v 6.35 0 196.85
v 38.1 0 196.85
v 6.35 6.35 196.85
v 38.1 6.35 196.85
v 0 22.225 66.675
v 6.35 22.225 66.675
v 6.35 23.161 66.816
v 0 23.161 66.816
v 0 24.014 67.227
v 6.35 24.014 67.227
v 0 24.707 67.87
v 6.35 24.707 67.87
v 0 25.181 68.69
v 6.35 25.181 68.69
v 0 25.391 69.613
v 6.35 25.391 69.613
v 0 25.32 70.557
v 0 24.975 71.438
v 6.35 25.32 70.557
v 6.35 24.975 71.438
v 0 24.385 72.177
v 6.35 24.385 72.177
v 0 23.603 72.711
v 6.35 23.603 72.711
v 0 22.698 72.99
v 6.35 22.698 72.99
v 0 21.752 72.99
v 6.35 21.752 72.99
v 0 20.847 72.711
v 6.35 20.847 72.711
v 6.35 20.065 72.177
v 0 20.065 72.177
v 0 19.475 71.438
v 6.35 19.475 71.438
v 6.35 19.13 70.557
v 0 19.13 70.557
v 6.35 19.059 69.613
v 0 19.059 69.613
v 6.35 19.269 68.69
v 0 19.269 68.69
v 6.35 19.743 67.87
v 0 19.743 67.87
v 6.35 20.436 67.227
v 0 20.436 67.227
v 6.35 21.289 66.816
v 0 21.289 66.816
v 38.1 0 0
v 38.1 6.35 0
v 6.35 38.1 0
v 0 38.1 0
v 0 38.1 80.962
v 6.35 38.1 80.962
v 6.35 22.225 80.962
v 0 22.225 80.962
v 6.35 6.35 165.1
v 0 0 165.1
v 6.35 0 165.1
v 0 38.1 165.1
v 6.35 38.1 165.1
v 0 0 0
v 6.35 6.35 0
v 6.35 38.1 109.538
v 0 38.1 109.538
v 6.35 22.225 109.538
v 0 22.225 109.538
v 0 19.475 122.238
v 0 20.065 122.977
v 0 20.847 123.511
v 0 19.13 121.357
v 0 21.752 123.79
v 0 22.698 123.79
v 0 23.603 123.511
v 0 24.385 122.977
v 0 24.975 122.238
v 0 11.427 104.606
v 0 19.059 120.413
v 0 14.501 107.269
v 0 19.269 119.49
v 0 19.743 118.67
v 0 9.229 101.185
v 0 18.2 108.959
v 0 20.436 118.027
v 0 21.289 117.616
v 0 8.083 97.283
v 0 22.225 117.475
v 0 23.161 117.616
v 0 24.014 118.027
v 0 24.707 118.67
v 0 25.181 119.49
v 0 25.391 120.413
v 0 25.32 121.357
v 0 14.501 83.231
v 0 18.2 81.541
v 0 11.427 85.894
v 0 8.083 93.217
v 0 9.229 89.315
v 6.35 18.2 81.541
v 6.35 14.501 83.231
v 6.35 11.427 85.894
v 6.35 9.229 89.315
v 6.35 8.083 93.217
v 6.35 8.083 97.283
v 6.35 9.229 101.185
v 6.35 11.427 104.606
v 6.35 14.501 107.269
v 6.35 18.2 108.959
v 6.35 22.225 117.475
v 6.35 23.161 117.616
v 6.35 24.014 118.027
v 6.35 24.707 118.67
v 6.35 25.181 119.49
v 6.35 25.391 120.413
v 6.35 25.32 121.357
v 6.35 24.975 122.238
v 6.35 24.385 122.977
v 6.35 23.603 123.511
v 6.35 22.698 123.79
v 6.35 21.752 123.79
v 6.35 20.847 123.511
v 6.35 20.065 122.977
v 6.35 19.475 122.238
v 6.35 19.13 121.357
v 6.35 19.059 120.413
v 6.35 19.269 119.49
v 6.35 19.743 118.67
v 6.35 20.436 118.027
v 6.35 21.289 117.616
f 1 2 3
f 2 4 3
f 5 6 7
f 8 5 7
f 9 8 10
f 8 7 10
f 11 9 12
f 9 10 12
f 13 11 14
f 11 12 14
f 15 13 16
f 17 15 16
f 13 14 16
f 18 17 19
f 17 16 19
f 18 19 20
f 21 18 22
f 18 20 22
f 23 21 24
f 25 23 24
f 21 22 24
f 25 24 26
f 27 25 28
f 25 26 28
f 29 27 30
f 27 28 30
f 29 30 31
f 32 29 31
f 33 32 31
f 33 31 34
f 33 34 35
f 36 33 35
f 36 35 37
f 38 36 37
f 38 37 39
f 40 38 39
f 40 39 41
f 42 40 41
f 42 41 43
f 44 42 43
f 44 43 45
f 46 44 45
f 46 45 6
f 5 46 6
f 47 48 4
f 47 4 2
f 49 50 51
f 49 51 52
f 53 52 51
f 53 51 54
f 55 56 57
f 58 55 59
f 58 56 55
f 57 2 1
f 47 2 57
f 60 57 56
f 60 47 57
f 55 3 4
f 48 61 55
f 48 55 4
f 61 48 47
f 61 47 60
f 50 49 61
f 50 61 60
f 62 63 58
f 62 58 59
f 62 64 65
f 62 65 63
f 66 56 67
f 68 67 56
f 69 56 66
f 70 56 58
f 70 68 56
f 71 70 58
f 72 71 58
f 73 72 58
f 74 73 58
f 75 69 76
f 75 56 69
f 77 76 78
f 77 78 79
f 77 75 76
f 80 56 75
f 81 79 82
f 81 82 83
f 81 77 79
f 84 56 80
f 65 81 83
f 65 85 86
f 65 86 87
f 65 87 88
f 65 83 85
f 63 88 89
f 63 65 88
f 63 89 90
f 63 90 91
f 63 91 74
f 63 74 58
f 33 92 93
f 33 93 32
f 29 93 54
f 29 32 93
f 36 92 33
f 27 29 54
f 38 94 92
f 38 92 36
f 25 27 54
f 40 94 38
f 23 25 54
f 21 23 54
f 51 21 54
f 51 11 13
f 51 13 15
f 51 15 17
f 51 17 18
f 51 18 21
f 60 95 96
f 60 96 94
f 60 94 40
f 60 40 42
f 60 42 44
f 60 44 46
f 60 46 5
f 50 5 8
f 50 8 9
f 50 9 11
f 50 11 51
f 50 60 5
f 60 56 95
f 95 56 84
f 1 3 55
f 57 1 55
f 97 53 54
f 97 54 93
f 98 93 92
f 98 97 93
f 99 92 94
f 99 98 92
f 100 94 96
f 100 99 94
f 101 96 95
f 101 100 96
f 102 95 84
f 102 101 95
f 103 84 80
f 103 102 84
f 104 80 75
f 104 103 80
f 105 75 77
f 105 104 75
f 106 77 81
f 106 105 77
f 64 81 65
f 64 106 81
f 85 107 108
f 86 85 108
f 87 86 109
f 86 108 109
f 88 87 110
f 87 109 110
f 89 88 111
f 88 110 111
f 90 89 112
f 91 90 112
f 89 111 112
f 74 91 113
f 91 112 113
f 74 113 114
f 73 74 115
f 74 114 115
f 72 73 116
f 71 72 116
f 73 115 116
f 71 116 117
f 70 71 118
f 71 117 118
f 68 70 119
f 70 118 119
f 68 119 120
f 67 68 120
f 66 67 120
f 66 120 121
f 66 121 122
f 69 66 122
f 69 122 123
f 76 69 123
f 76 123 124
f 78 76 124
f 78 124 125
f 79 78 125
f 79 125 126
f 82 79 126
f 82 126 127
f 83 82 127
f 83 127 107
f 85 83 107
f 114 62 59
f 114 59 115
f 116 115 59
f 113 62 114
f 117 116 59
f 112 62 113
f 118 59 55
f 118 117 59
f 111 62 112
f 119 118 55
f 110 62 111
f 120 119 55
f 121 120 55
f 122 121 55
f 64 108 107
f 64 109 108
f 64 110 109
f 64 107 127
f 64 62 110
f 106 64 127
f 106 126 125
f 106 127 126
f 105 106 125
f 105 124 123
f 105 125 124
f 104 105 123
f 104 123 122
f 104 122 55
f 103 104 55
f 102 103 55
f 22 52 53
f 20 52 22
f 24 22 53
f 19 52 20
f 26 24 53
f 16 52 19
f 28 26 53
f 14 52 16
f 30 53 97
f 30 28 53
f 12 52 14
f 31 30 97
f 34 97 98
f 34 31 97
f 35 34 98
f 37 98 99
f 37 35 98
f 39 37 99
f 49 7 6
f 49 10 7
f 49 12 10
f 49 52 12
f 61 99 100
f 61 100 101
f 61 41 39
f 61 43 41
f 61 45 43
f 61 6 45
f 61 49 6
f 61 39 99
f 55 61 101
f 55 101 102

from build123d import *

# Parameters (mm, degrees)
BOSS_EXTRUDE1_DEPTH = 196.85
SKETCH2_W           = 31.75
SKETCH2_H           = 38.1
CUT_EXTRUDE1_DEPTH  = 6.35
SKETCH3_R           = 3.175
CUT_EXTRUDE2_DEPTH  = 7.35


with BuildPart() as part:
    # Sketch1 → Boss-Extrude1 (new body)
    with BuildSketch(Plane.XY):
        Polygon((0, 0), (0, 38.1), (6.35, 38.1), (6.35, 6.35), (38.1, 6.35), (38.1, 0), align=None)
    extrude(amount=BOSS_EXTRUDE1_DEPTH)

    # Sketch2 → Cut-Extrude1 (cut)
    with BuildSketch(Plane(origin=(0, 0, 0), x_dir=(0, 0, -1), z_dir=(1, 0, 0))):
        with Locations((-180.975, 19.05)):
            Rectangle(SKETCH2_W, SKETCH2_H)
    extrude(amount=CUT_EXTRUDE1_DEPTH, mode=Mode.SUBTRACT)

    # Sketch3 → Cut-Extrude2 (cut, through all)
    with BuildSketch(Plane(origin=(6.35, 0, 0), x_dir=(0, 0, -1), z_dir=(1, 0, 0))):
        with Locations((-120.65, 22.225)):
            Circle(SKETCH3_R)
        with Locations((-69.85, 22.225)):
            Circle(SKETCH3_R)
        with BuildLine():
            Line((-109.5375, 22.225), (-109.5375, 38.1))
            Line((-109.5375, 38.1), (-80.9625, 38.1))
            Line((-80.9625, 38.1), (-80.9625, 22.225))
            ThreePointArc((-80.9625, 22.225), (-95.25, 7.9375), (-109.5375, 22.225))
        make_face()
    extrude(amount=-CUT_EXTRUDE2_DEPTH, mode=Mode.SUBTRACT)


solid = part.part
